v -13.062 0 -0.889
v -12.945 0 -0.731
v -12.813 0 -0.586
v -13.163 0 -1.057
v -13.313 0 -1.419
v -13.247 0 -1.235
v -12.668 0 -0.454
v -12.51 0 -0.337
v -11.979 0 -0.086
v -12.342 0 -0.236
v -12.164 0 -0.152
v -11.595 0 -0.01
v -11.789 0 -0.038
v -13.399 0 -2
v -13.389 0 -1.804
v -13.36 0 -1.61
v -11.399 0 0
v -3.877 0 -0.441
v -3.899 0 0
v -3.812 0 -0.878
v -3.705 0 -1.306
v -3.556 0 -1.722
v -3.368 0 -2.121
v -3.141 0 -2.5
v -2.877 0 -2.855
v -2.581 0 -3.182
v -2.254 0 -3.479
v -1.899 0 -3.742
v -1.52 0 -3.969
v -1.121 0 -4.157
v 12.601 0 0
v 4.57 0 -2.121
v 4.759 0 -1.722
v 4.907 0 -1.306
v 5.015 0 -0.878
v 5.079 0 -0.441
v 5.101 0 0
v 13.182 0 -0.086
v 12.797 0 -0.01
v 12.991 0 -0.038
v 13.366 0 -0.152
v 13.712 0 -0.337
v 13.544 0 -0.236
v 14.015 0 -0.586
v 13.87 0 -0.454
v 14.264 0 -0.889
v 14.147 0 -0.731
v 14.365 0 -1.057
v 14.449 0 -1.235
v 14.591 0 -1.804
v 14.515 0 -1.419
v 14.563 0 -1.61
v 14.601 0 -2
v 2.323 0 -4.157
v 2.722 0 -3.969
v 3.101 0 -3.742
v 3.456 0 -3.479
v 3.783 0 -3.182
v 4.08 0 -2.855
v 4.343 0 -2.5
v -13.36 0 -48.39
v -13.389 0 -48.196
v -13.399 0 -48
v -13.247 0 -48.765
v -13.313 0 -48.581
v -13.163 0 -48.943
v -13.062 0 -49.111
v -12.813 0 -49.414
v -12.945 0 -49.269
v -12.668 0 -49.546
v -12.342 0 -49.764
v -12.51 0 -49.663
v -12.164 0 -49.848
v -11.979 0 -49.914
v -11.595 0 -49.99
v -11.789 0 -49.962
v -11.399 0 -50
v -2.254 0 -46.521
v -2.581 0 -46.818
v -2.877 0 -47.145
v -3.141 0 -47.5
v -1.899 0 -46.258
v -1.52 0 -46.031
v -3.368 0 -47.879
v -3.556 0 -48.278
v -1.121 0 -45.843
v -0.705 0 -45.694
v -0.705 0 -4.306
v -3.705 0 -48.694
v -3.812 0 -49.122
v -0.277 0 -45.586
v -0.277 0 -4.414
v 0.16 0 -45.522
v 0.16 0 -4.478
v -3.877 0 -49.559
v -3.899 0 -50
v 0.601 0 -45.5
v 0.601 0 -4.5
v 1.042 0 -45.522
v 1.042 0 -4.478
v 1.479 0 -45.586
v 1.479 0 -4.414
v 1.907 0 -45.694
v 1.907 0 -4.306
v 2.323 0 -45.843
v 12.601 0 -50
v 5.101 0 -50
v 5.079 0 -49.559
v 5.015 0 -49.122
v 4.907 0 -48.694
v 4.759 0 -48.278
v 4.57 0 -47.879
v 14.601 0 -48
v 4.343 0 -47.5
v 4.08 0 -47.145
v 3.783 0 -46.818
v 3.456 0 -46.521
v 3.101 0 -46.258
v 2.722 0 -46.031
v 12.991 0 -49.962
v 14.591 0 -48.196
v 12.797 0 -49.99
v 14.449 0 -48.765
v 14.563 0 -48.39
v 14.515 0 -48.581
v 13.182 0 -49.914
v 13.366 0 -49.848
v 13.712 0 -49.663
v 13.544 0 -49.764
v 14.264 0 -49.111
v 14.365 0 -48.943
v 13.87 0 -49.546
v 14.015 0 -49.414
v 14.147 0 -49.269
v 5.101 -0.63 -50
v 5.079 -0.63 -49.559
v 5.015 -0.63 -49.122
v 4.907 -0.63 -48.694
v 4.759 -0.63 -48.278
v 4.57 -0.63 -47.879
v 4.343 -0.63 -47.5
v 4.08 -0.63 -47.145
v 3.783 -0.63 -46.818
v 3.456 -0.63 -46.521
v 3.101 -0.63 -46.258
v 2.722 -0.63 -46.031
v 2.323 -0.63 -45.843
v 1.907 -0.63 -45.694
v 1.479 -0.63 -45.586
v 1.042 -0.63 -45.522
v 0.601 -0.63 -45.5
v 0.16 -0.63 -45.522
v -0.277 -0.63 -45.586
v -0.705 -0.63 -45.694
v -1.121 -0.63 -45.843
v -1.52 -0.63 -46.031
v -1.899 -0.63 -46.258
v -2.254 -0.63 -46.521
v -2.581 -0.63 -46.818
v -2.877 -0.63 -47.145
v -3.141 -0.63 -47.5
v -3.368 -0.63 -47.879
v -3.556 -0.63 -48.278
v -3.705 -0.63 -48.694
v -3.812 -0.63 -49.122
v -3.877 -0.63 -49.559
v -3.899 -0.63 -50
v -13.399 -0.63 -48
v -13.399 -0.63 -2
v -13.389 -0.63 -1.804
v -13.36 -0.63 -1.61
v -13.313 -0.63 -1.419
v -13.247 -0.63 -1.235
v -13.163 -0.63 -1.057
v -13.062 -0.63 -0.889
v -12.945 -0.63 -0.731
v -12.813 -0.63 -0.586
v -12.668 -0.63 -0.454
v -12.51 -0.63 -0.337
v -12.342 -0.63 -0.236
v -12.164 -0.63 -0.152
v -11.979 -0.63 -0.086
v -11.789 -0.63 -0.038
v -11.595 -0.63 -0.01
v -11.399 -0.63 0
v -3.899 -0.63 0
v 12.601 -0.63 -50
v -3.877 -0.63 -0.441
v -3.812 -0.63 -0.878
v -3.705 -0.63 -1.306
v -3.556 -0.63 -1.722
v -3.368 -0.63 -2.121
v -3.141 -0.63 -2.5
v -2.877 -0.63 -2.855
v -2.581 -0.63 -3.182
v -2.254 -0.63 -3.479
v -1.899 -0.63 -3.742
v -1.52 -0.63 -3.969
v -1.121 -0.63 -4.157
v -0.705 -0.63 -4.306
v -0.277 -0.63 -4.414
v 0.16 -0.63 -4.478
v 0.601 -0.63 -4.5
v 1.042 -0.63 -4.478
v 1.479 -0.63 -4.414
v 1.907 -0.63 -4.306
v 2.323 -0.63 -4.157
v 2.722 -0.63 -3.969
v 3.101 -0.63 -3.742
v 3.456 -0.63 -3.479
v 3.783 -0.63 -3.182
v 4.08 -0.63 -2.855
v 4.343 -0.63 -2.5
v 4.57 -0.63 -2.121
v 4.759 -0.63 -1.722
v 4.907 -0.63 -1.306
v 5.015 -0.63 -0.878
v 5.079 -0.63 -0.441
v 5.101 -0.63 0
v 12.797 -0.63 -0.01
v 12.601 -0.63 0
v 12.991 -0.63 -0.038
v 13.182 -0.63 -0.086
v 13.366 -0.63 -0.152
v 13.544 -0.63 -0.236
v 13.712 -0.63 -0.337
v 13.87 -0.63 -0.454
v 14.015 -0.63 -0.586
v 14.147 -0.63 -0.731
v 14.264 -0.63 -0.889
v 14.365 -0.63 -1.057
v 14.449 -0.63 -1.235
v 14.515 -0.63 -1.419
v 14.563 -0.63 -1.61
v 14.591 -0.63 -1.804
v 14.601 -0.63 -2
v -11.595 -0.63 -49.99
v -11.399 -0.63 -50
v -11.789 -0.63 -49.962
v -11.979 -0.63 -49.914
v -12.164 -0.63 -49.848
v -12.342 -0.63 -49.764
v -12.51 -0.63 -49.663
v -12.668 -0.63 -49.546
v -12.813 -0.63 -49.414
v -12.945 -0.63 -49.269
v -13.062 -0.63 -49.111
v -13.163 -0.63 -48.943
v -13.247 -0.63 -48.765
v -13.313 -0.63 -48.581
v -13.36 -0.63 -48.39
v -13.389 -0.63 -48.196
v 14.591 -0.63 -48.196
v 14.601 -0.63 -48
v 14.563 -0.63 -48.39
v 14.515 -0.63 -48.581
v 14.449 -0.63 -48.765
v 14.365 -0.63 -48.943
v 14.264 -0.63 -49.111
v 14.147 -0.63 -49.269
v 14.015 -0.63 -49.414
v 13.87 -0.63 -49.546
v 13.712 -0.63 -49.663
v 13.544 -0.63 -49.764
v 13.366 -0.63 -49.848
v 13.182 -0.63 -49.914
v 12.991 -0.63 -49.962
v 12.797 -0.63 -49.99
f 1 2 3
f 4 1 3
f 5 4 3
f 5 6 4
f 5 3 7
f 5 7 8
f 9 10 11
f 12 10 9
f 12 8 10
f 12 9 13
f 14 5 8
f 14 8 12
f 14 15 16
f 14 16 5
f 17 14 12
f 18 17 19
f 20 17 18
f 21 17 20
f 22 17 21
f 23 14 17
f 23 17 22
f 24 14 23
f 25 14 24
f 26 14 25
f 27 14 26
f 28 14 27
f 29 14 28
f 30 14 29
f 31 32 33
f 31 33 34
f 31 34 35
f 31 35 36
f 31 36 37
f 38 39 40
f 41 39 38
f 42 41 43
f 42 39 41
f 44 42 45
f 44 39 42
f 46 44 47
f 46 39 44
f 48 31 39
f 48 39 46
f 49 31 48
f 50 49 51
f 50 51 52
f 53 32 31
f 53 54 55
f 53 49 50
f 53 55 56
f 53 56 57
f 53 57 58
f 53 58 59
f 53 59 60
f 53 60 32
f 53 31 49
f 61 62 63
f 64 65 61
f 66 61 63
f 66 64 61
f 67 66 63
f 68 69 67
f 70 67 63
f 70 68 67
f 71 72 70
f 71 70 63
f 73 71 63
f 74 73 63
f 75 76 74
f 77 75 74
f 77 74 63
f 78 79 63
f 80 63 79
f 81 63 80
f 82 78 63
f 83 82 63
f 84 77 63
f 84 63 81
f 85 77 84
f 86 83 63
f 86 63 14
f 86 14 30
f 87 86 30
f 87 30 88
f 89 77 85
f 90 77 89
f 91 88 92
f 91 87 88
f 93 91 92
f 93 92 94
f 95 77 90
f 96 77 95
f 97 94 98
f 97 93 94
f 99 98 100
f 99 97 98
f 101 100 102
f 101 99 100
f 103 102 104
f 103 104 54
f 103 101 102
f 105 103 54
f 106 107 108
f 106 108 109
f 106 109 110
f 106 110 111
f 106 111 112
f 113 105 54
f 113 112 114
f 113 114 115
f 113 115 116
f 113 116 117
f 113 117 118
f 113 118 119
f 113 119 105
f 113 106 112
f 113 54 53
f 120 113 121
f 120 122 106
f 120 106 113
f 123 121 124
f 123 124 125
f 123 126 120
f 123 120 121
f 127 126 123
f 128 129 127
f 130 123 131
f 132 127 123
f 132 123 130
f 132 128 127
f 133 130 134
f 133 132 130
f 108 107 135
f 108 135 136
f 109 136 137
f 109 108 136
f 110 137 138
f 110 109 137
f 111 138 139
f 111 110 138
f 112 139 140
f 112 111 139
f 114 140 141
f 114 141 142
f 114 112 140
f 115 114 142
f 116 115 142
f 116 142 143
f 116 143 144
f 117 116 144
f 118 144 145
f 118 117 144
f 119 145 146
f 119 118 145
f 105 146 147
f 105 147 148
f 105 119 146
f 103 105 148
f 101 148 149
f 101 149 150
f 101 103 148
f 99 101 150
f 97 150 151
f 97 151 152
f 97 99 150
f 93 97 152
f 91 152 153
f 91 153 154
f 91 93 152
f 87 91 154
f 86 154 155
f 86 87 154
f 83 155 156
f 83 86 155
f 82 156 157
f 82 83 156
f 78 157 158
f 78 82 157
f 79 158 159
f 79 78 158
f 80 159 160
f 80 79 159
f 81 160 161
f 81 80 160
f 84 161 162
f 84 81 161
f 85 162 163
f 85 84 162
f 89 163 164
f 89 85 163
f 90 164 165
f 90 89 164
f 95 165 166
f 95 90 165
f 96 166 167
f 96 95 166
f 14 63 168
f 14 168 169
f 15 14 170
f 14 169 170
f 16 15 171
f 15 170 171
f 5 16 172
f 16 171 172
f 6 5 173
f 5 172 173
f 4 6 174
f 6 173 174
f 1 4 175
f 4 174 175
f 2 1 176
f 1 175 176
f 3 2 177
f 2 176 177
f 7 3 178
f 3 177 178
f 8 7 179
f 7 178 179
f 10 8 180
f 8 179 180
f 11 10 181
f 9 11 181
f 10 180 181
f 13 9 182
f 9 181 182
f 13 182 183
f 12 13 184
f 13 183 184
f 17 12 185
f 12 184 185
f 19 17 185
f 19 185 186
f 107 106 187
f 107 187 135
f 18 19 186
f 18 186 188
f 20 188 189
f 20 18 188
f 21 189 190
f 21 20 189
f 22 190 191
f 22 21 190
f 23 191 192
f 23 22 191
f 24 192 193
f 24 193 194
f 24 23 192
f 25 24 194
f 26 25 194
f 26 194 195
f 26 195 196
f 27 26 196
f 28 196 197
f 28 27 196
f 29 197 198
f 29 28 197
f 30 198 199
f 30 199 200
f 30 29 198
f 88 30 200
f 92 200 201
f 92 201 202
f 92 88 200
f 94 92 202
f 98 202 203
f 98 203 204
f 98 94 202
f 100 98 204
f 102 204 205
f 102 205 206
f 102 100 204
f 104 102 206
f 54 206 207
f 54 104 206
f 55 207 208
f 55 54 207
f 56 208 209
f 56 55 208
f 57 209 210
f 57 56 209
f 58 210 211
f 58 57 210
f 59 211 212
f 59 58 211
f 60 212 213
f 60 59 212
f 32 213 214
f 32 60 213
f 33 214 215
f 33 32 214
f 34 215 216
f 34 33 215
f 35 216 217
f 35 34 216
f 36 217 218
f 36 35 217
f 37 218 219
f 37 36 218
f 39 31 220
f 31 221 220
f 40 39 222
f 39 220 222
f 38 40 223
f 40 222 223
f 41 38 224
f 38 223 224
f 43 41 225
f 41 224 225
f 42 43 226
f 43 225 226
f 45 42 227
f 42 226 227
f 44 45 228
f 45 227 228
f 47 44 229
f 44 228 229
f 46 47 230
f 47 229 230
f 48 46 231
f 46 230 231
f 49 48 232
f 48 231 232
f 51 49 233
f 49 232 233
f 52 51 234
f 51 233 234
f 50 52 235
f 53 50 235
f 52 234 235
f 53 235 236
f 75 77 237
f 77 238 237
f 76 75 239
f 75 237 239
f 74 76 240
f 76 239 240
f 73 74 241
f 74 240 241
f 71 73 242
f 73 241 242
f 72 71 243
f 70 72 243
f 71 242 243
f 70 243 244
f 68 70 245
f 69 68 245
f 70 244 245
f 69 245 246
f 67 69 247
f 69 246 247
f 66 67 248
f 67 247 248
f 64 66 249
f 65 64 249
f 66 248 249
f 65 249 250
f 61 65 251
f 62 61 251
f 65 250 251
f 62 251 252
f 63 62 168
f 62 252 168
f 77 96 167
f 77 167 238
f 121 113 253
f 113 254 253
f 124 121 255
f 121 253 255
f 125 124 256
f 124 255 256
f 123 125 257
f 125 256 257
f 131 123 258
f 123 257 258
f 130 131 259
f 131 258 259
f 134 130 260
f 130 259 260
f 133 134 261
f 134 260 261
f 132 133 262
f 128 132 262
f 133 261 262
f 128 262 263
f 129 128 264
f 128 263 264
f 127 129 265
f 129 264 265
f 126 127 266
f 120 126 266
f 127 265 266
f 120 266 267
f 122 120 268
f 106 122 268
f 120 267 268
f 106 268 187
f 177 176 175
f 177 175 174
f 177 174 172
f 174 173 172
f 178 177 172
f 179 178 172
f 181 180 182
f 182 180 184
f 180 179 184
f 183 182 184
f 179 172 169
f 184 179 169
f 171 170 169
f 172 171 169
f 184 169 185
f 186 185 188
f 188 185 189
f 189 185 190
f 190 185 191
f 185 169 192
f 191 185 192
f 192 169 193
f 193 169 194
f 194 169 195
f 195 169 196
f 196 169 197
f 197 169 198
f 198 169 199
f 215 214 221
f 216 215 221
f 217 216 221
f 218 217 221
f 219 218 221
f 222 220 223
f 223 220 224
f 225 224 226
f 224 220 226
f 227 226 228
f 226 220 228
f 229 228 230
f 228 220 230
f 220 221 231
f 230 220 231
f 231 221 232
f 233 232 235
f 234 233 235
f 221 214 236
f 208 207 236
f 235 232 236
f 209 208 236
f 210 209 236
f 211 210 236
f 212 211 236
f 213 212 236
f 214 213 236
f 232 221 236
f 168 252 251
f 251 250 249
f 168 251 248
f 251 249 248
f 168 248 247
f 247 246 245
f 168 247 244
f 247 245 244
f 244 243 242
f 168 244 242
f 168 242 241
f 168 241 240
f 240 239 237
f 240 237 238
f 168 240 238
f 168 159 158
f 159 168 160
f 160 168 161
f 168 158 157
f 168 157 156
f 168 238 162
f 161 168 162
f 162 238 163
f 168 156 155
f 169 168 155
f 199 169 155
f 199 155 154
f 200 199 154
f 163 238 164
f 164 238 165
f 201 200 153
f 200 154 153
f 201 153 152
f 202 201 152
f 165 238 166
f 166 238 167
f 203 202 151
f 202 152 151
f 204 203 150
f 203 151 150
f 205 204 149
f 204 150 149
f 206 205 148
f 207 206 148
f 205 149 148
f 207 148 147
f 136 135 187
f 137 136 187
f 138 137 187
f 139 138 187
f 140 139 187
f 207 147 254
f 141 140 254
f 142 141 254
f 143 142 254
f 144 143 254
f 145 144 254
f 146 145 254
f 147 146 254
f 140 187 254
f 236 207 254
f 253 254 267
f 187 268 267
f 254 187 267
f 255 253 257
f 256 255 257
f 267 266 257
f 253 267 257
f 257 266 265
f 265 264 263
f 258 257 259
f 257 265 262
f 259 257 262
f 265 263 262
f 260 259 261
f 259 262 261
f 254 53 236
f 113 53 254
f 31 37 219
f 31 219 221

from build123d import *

# Parameters (mm, degrees)
EXTRUDE_1_DEPTH = 0.63
FILLET_3_R      = 2


with BuildPart() as part:
    # Sketch 1 → Extrude 1 (new body)
    with BuildSketch(Plane(origin=(0, 0, 0), x_dir=(1, 0, 0), z_dir=(0, 1, 0))):
        with BuildLine():
            Line((5.101078805, 0), (14.601078805, 0))
            Line((14.601078805, 0), (14.601078805, 50))
            Line((14.601078805, 50), (5.101078805, 50))
            ThreePointArc((5.101078805, 50), (0.601078805, 45.5), (-3.898921195, 50))
            Line((-3.898921195, 50), (-13.398921195, 50))
            Line((-13.398921195, 50), (-13.398921195, 0))
            Line((-13.398921195, 0), (-3.898921195, 0))
            ThreePointArc((-3.898921195, 0), (0.601078805, 4.5), (5.101078805, 0))
        make_face()
    extrude(amount=-EXTRUDE_1_DEPTH)

    # Fillet 3
    fillet_3_edges = [part.edges().sort_by_distance(p)[0] for p in [
        (-13.398921195, -0.315, 0),
        (-13.398921195, -0.315, -50),
        (14.601078805, -0.315, -50),
        (14.601078805, -0.315, 0),
    ]]
    fillet(fillet_3_edges, radius=FILLET_3_R)


solid = part.part
